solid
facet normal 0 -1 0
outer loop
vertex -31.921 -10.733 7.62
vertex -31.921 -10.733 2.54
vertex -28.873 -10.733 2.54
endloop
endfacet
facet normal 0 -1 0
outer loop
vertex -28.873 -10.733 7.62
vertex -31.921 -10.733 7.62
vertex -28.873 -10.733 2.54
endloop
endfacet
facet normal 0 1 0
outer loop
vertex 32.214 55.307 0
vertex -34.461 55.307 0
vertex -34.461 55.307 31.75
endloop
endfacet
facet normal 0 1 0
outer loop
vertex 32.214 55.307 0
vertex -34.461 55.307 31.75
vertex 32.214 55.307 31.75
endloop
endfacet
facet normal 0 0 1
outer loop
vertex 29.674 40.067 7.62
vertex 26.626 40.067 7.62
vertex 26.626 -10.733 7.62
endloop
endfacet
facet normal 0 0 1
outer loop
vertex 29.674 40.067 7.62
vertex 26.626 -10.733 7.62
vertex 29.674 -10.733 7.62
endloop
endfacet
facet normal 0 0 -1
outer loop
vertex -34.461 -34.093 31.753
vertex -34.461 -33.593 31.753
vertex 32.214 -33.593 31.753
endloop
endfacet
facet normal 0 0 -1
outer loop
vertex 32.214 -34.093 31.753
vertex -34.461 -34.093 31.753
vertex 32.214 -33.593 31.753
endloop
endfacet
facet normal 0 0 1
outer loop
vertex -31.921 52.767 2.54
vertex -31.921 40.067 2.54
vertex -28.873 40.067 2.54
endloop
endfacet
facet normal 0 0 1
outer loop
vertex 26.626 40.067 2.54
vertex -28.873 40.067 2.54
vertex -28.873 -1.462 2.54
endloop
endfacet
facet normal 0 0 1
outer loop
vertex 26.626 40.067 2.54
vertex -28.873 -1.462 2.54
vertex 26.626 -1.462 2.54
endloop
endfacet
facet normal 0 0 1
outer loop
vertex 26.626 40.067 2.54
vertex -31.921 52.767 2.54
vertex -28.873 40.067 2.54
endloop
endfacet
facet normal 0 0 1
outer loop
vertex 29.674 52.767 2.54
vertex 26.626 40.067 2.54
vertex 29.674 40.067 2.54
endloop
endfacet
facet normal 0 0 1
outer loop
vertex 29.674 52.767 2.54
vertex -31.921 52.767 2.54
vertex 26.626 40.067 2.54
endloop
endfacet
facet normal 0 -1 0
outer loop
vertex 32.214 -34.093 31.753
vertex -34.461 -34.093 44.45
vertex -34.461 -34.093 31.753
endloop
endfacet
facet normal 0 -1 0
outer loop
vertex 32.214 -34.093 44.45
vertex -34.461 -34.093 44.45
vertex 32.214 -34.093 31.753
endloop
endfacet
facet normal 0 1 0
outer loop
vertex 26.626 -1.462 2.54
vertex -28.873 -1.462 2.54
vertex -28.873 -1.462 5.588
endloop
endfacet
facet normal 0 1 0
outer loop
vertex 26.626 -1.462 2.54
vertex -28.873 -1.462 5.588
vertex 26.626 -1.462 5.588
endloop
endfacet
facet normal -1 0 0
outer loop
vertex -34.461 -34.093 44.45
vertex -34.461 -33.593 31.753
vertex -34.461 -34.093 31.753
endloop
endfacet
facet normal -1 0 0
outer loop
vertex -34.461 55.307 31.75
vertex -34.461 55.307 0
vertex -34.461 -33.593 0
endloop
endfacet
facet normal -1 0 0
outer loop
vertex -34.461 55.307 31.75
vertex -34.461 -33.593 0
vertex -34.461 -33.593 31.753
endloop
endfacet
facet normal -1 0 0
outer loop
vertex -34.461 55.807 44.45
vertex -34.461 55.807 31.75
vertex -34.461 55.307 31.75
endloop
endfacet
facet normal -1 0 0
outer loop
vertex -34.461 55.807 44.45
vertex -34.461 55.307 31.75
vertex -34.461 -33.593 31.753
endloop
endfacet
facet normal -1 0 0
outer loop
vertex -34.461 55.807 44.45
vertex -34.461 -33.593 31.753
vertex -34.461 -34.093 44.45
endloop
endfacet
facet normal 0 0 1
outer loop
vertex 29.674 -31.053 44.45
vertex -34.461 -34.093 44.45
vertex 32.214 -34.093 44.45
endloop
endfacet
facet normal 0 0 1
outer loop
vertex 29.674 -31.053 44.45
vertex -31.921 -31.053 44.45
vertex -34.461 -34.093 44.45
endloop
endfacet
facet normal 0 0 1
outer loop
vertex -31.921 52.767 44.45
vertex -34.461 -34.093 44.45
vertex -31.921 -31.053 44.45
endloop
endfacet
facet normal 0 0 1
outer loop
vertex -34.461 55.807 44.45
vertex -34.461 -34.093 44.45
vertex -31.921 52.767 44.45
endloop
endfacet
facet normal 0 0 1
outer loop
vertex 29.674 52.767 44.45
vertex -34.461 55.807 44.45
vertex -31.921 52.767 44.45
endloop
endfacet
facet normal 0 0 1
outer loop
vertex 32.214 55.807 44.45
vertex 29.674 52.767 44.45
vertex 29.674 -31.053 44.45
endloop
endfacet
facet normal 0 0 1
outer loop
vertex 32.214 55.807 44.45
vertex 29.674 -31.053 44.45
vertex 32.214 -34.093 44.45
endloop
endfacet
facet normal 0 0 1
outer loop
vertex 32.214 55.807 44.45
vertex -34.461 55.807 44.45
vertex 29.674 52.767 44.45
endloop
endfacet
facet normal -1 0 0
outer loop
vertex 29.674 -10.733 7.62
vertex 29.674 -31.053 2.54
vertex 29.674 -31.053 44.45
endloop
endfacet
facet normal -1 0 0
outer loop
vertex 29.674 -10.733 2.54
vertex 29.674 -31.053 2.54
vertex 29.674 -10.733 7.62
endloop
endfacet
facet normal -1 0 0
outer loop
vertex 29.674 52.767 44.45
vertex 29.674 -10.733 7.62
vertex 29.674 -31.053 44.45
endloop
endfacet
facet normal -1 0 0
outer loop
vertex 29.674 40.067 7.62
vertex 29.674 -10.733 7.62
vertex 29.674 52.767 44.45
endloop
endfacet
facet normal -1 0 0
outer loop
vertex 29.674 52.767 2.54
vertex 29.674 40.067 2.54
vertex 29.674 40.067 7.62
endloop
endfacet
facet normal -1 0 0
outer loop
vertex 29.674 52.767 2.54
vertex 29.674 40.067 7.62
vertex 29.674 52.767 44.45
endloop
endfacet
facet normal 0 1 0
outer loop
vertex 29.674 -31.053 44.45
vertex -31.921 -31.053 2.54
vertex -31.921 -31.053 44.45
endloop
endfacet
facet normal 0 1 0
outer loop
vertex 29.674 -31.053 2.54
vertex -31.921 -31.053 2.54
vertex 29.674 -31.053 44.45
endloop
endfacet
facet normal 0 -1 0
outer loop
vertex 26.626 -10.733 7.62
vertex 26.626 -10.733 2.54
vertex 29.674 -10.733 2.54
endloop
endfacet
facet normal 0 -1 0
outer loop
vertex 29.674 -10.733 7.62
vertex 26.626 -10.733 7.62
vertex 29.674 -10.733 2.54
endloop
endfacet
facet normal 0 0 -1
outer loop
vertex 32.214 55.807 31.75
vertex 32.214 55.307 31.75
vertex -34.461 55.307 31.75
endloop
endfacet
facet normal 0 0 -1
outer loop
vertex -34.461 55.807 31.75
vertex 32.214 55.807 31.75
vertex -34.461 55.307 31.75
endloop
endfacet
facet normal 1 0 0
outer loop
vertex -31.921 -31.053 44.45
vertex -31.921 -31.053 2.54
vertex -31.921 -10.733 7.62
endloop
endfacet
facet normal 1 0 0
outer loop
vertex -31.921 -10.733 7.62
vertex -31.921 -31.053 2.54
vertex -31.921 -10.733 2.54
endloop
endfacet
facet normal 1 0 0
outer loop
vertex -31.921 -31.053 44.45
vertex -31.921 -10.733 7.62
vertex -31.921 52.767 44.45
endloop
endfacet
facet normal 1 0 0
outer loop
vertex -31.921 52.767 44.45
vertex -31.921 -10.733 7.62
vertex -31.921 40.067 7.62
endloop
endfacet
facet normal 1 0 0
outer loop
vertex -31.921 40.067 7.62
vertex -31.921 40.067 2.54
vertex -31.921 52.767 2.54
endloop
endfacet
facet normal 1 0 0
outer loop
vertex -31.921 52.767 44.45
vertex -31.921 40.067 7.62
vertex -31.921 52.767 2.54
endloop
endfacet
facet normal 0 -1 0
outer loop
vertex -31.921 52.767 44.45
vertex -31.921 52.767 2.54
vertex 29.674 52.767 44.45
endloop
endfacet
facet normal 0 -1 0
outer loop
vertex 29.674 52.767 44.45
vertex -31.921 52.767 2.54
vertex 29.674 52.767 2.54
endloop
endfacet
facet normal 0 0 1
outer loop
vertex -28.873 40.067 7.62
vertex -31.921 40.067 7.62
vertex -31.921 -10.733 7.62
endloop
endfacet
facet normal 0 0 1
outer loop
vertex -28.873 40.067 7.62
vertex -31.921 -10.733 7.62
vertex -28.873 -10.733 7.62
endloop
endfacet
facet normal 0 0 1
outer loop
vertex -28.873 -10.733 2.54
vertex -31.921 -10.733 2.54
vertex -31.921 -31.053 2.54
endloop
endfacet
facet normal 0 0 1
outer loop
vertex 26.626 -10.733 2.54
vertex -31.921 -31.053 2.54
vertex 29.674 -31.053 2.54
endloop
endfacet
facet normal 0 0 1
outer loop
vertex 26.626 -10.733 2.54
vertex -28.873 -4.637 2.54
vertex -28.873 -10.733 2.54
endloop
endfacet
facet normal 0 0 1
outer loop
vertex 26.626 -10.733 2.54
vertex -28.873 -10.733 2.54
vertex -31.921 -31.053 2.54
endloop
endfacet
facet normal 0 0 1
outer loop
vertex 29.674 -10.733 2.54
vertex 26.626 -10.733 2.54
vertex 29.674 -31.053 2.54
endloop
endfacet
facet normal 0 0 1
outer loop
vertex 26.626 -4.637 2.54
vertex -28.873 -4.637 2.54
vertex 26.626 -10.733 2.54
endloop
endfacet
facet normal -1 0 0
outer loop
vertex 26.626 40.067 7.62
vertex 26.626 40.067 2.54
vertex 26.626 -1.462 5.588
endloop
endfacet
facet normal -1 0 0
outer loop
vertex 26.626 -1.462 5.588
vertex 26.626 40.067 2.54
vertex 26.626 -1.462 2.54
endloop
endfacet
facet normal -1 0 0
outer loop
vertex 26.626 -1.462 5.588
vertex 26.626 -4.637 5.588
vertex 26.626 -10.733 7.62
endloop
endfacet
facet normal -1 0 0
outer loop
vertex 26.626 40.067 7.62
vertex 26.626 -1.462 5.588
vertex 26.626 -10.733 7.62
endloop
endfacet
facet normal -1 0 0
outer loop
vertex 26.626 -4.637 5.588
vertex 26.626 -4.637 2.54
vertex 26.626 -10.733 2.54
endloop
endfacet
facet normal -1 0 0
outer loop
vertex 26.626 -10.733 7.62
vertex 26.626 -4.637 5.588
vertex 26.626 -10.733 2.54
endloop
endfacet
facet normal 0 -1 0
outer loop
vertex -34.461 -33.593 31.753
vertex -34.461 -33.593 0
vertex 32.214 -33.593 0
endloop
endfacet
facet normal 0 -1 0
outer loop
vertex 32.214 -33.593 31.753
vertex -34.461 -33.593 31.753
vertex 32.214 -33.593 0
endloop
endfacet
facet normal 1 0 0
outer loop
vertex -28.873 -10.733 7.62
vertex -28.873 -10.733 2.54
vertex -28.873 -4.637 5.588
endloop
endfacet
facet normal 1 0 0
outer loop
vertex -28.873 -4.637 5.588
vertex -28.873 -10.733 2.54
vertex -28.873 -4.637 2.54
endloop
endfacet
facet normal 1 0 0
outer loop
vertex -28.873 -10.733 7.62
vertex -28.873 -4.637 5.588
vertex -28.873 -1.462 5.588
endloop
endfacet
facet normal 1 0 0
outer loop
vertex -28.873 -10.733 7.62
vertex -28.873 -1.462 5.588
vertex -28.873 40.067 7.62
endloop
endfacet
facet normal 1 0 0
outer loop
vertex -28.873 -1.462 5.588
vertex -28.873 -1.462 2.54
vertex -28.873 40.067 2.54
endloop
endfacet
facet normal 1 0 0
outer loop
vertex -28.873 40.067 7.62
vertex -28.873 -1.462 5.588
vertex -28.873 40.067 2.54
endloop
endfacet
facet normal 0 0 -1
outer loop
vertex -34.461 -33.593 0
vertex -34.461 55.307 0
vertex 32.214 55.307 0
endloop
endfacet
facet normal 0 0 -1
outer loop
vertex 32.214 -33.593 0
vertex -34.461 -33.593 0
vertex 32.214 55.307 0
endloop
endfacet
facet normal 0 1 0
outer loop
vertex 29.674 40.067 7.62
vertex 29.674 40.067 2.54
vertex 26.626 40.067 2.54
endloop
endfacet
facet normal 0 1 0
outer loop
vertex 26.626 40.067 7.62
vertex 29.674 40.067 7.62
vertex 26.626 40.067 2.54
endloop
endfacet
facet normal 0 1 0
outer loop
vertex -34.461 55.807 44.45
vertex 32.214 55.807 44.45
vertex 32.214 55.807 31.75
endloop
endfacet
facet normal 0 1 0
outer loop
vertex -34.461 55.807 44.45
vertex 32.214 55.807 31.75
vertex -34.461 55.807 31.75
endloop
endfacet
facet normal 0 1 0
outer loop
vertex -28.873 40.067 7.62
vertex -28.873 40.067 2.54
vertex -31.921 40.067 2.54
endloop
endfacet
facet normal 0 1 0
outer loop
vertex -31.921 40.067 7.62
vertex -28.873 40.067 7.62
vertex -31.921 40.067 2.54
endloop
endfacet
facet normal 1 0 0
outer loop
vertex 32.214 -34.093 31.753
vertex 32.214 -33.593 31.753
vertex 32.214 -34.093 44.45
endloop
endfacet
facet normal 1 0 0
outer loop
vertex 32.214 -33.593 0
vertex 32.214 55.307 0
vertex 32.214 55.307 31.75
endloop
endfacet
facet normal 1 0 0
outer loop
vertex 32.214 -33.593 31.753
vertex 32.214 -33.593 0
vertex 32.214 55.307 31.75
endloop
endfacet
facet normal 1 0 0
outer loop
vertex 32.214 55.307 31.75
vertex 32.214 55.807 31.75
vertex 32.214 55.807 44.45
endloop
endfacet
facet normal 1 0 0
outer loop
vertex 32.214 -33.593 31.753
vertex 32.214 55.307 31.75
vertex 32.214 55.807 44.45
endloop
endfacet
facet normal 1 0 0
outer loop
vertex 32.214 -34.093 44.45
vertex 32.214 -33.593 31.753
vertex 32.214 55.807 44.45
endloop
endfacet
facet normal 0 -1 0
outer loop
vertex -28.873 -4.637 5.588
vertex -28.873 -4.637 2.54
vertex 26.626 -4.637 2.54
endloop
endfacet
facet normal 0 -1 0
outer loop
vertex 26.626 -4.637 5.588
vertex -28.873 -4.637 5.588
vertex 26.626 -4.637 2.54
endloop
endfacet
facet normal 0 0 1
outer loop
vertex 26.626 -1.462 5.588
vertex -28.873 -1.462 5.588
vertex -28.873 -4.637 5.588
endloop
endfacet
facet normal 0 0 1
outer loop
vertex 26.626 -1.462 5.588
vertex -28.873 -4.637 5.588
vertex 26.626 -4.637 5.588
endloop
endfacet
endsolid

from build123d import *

# Parameters (mm, degrees)
F0_W     = 66.675
F0_H     = 88.9
F1_DEPTH = 44.45
F2_T     = -2.54
F4_DEPTH = 5.08
F3_W     = 55.499
F3_H     = 3.175
F5_DEPTH = 3.048
F6_W     = 66.675
F6_H     = 12.7
F7_DEPTH = 0.5
F8_W     = 66.675
F8_H     = 12.6965791702
F9_DEPTH = 0.5


with BuildPart() as f1:
    # F0 (on Top) → F1 (new body)
    with BuildSketch(Plane.XY):
        with Locations((-1.1231470853, 10.8568438743)):
            Rectangle(F0_W, F0_H)
    extrude(amount=F1_DEPTH)

    # F2
    f2_openings = [f1.faces().sort_by_distance(p)[0] for p in [
        (-1.123147, 10.856844, 44.45),
    ]]
    offset(amount=F2_T, openings=f2_openings)

    # F3 (on face) → F4 (join)
    with BuildSketch(Plane.XY.offset(2.54)):
        Polygon((29.6743529147, 40.0668438743), (26.6263529147, 40.0668438743), (26.6263529147, -1.4621561257), (26.6263529147, -4.6371561257), (26.6263529147, -10.7331561257), (29.6743529147, -10.7331561257), align=None)
        Polygon((-28.8726470853, 40.0668438743), (-31.9206470853, 40.0668438743), (-31.9206470853, -10.7331561257), (-28.8726470853, -10.7331561257), (-28.8726470853, -4.6371561257), (-28.8726470853, -1.4621561257), align=None)
    extrude(amount=F4_DEPTH)

    # F3 (on face) → F5 (join)
    with BuildSketch(Plane.XY.offset(2.54)):
        with Locations((-1.1231470853, -3.0496561257)):
            Rectangle(F3_W, F3_H)
    extrude(amount=F5_DEPTH)

    # F6 (on face) → F7 (join)
    with BuildSketch(Plane(origin=(0, 55.3068438743, 0), x_dir=(-1, 0, 0), z_dir=(0, 1, 0))):
        with Locations((1.1231470853, 38.1)):
            Rectangle(F6_W, F6_H)
    extrude(amount=F7_DEPTH)

    # F8 (on face) → F9 (join)
    with BuildSketch(Plane.XZ.offset(33.5931561257)):
        with Locations((-1.1231470853, 38.1017104149)):
            Rectangle(F8_W, F8_H)
    extrude(amount=F9_DEPTH)


solid = f1.part
